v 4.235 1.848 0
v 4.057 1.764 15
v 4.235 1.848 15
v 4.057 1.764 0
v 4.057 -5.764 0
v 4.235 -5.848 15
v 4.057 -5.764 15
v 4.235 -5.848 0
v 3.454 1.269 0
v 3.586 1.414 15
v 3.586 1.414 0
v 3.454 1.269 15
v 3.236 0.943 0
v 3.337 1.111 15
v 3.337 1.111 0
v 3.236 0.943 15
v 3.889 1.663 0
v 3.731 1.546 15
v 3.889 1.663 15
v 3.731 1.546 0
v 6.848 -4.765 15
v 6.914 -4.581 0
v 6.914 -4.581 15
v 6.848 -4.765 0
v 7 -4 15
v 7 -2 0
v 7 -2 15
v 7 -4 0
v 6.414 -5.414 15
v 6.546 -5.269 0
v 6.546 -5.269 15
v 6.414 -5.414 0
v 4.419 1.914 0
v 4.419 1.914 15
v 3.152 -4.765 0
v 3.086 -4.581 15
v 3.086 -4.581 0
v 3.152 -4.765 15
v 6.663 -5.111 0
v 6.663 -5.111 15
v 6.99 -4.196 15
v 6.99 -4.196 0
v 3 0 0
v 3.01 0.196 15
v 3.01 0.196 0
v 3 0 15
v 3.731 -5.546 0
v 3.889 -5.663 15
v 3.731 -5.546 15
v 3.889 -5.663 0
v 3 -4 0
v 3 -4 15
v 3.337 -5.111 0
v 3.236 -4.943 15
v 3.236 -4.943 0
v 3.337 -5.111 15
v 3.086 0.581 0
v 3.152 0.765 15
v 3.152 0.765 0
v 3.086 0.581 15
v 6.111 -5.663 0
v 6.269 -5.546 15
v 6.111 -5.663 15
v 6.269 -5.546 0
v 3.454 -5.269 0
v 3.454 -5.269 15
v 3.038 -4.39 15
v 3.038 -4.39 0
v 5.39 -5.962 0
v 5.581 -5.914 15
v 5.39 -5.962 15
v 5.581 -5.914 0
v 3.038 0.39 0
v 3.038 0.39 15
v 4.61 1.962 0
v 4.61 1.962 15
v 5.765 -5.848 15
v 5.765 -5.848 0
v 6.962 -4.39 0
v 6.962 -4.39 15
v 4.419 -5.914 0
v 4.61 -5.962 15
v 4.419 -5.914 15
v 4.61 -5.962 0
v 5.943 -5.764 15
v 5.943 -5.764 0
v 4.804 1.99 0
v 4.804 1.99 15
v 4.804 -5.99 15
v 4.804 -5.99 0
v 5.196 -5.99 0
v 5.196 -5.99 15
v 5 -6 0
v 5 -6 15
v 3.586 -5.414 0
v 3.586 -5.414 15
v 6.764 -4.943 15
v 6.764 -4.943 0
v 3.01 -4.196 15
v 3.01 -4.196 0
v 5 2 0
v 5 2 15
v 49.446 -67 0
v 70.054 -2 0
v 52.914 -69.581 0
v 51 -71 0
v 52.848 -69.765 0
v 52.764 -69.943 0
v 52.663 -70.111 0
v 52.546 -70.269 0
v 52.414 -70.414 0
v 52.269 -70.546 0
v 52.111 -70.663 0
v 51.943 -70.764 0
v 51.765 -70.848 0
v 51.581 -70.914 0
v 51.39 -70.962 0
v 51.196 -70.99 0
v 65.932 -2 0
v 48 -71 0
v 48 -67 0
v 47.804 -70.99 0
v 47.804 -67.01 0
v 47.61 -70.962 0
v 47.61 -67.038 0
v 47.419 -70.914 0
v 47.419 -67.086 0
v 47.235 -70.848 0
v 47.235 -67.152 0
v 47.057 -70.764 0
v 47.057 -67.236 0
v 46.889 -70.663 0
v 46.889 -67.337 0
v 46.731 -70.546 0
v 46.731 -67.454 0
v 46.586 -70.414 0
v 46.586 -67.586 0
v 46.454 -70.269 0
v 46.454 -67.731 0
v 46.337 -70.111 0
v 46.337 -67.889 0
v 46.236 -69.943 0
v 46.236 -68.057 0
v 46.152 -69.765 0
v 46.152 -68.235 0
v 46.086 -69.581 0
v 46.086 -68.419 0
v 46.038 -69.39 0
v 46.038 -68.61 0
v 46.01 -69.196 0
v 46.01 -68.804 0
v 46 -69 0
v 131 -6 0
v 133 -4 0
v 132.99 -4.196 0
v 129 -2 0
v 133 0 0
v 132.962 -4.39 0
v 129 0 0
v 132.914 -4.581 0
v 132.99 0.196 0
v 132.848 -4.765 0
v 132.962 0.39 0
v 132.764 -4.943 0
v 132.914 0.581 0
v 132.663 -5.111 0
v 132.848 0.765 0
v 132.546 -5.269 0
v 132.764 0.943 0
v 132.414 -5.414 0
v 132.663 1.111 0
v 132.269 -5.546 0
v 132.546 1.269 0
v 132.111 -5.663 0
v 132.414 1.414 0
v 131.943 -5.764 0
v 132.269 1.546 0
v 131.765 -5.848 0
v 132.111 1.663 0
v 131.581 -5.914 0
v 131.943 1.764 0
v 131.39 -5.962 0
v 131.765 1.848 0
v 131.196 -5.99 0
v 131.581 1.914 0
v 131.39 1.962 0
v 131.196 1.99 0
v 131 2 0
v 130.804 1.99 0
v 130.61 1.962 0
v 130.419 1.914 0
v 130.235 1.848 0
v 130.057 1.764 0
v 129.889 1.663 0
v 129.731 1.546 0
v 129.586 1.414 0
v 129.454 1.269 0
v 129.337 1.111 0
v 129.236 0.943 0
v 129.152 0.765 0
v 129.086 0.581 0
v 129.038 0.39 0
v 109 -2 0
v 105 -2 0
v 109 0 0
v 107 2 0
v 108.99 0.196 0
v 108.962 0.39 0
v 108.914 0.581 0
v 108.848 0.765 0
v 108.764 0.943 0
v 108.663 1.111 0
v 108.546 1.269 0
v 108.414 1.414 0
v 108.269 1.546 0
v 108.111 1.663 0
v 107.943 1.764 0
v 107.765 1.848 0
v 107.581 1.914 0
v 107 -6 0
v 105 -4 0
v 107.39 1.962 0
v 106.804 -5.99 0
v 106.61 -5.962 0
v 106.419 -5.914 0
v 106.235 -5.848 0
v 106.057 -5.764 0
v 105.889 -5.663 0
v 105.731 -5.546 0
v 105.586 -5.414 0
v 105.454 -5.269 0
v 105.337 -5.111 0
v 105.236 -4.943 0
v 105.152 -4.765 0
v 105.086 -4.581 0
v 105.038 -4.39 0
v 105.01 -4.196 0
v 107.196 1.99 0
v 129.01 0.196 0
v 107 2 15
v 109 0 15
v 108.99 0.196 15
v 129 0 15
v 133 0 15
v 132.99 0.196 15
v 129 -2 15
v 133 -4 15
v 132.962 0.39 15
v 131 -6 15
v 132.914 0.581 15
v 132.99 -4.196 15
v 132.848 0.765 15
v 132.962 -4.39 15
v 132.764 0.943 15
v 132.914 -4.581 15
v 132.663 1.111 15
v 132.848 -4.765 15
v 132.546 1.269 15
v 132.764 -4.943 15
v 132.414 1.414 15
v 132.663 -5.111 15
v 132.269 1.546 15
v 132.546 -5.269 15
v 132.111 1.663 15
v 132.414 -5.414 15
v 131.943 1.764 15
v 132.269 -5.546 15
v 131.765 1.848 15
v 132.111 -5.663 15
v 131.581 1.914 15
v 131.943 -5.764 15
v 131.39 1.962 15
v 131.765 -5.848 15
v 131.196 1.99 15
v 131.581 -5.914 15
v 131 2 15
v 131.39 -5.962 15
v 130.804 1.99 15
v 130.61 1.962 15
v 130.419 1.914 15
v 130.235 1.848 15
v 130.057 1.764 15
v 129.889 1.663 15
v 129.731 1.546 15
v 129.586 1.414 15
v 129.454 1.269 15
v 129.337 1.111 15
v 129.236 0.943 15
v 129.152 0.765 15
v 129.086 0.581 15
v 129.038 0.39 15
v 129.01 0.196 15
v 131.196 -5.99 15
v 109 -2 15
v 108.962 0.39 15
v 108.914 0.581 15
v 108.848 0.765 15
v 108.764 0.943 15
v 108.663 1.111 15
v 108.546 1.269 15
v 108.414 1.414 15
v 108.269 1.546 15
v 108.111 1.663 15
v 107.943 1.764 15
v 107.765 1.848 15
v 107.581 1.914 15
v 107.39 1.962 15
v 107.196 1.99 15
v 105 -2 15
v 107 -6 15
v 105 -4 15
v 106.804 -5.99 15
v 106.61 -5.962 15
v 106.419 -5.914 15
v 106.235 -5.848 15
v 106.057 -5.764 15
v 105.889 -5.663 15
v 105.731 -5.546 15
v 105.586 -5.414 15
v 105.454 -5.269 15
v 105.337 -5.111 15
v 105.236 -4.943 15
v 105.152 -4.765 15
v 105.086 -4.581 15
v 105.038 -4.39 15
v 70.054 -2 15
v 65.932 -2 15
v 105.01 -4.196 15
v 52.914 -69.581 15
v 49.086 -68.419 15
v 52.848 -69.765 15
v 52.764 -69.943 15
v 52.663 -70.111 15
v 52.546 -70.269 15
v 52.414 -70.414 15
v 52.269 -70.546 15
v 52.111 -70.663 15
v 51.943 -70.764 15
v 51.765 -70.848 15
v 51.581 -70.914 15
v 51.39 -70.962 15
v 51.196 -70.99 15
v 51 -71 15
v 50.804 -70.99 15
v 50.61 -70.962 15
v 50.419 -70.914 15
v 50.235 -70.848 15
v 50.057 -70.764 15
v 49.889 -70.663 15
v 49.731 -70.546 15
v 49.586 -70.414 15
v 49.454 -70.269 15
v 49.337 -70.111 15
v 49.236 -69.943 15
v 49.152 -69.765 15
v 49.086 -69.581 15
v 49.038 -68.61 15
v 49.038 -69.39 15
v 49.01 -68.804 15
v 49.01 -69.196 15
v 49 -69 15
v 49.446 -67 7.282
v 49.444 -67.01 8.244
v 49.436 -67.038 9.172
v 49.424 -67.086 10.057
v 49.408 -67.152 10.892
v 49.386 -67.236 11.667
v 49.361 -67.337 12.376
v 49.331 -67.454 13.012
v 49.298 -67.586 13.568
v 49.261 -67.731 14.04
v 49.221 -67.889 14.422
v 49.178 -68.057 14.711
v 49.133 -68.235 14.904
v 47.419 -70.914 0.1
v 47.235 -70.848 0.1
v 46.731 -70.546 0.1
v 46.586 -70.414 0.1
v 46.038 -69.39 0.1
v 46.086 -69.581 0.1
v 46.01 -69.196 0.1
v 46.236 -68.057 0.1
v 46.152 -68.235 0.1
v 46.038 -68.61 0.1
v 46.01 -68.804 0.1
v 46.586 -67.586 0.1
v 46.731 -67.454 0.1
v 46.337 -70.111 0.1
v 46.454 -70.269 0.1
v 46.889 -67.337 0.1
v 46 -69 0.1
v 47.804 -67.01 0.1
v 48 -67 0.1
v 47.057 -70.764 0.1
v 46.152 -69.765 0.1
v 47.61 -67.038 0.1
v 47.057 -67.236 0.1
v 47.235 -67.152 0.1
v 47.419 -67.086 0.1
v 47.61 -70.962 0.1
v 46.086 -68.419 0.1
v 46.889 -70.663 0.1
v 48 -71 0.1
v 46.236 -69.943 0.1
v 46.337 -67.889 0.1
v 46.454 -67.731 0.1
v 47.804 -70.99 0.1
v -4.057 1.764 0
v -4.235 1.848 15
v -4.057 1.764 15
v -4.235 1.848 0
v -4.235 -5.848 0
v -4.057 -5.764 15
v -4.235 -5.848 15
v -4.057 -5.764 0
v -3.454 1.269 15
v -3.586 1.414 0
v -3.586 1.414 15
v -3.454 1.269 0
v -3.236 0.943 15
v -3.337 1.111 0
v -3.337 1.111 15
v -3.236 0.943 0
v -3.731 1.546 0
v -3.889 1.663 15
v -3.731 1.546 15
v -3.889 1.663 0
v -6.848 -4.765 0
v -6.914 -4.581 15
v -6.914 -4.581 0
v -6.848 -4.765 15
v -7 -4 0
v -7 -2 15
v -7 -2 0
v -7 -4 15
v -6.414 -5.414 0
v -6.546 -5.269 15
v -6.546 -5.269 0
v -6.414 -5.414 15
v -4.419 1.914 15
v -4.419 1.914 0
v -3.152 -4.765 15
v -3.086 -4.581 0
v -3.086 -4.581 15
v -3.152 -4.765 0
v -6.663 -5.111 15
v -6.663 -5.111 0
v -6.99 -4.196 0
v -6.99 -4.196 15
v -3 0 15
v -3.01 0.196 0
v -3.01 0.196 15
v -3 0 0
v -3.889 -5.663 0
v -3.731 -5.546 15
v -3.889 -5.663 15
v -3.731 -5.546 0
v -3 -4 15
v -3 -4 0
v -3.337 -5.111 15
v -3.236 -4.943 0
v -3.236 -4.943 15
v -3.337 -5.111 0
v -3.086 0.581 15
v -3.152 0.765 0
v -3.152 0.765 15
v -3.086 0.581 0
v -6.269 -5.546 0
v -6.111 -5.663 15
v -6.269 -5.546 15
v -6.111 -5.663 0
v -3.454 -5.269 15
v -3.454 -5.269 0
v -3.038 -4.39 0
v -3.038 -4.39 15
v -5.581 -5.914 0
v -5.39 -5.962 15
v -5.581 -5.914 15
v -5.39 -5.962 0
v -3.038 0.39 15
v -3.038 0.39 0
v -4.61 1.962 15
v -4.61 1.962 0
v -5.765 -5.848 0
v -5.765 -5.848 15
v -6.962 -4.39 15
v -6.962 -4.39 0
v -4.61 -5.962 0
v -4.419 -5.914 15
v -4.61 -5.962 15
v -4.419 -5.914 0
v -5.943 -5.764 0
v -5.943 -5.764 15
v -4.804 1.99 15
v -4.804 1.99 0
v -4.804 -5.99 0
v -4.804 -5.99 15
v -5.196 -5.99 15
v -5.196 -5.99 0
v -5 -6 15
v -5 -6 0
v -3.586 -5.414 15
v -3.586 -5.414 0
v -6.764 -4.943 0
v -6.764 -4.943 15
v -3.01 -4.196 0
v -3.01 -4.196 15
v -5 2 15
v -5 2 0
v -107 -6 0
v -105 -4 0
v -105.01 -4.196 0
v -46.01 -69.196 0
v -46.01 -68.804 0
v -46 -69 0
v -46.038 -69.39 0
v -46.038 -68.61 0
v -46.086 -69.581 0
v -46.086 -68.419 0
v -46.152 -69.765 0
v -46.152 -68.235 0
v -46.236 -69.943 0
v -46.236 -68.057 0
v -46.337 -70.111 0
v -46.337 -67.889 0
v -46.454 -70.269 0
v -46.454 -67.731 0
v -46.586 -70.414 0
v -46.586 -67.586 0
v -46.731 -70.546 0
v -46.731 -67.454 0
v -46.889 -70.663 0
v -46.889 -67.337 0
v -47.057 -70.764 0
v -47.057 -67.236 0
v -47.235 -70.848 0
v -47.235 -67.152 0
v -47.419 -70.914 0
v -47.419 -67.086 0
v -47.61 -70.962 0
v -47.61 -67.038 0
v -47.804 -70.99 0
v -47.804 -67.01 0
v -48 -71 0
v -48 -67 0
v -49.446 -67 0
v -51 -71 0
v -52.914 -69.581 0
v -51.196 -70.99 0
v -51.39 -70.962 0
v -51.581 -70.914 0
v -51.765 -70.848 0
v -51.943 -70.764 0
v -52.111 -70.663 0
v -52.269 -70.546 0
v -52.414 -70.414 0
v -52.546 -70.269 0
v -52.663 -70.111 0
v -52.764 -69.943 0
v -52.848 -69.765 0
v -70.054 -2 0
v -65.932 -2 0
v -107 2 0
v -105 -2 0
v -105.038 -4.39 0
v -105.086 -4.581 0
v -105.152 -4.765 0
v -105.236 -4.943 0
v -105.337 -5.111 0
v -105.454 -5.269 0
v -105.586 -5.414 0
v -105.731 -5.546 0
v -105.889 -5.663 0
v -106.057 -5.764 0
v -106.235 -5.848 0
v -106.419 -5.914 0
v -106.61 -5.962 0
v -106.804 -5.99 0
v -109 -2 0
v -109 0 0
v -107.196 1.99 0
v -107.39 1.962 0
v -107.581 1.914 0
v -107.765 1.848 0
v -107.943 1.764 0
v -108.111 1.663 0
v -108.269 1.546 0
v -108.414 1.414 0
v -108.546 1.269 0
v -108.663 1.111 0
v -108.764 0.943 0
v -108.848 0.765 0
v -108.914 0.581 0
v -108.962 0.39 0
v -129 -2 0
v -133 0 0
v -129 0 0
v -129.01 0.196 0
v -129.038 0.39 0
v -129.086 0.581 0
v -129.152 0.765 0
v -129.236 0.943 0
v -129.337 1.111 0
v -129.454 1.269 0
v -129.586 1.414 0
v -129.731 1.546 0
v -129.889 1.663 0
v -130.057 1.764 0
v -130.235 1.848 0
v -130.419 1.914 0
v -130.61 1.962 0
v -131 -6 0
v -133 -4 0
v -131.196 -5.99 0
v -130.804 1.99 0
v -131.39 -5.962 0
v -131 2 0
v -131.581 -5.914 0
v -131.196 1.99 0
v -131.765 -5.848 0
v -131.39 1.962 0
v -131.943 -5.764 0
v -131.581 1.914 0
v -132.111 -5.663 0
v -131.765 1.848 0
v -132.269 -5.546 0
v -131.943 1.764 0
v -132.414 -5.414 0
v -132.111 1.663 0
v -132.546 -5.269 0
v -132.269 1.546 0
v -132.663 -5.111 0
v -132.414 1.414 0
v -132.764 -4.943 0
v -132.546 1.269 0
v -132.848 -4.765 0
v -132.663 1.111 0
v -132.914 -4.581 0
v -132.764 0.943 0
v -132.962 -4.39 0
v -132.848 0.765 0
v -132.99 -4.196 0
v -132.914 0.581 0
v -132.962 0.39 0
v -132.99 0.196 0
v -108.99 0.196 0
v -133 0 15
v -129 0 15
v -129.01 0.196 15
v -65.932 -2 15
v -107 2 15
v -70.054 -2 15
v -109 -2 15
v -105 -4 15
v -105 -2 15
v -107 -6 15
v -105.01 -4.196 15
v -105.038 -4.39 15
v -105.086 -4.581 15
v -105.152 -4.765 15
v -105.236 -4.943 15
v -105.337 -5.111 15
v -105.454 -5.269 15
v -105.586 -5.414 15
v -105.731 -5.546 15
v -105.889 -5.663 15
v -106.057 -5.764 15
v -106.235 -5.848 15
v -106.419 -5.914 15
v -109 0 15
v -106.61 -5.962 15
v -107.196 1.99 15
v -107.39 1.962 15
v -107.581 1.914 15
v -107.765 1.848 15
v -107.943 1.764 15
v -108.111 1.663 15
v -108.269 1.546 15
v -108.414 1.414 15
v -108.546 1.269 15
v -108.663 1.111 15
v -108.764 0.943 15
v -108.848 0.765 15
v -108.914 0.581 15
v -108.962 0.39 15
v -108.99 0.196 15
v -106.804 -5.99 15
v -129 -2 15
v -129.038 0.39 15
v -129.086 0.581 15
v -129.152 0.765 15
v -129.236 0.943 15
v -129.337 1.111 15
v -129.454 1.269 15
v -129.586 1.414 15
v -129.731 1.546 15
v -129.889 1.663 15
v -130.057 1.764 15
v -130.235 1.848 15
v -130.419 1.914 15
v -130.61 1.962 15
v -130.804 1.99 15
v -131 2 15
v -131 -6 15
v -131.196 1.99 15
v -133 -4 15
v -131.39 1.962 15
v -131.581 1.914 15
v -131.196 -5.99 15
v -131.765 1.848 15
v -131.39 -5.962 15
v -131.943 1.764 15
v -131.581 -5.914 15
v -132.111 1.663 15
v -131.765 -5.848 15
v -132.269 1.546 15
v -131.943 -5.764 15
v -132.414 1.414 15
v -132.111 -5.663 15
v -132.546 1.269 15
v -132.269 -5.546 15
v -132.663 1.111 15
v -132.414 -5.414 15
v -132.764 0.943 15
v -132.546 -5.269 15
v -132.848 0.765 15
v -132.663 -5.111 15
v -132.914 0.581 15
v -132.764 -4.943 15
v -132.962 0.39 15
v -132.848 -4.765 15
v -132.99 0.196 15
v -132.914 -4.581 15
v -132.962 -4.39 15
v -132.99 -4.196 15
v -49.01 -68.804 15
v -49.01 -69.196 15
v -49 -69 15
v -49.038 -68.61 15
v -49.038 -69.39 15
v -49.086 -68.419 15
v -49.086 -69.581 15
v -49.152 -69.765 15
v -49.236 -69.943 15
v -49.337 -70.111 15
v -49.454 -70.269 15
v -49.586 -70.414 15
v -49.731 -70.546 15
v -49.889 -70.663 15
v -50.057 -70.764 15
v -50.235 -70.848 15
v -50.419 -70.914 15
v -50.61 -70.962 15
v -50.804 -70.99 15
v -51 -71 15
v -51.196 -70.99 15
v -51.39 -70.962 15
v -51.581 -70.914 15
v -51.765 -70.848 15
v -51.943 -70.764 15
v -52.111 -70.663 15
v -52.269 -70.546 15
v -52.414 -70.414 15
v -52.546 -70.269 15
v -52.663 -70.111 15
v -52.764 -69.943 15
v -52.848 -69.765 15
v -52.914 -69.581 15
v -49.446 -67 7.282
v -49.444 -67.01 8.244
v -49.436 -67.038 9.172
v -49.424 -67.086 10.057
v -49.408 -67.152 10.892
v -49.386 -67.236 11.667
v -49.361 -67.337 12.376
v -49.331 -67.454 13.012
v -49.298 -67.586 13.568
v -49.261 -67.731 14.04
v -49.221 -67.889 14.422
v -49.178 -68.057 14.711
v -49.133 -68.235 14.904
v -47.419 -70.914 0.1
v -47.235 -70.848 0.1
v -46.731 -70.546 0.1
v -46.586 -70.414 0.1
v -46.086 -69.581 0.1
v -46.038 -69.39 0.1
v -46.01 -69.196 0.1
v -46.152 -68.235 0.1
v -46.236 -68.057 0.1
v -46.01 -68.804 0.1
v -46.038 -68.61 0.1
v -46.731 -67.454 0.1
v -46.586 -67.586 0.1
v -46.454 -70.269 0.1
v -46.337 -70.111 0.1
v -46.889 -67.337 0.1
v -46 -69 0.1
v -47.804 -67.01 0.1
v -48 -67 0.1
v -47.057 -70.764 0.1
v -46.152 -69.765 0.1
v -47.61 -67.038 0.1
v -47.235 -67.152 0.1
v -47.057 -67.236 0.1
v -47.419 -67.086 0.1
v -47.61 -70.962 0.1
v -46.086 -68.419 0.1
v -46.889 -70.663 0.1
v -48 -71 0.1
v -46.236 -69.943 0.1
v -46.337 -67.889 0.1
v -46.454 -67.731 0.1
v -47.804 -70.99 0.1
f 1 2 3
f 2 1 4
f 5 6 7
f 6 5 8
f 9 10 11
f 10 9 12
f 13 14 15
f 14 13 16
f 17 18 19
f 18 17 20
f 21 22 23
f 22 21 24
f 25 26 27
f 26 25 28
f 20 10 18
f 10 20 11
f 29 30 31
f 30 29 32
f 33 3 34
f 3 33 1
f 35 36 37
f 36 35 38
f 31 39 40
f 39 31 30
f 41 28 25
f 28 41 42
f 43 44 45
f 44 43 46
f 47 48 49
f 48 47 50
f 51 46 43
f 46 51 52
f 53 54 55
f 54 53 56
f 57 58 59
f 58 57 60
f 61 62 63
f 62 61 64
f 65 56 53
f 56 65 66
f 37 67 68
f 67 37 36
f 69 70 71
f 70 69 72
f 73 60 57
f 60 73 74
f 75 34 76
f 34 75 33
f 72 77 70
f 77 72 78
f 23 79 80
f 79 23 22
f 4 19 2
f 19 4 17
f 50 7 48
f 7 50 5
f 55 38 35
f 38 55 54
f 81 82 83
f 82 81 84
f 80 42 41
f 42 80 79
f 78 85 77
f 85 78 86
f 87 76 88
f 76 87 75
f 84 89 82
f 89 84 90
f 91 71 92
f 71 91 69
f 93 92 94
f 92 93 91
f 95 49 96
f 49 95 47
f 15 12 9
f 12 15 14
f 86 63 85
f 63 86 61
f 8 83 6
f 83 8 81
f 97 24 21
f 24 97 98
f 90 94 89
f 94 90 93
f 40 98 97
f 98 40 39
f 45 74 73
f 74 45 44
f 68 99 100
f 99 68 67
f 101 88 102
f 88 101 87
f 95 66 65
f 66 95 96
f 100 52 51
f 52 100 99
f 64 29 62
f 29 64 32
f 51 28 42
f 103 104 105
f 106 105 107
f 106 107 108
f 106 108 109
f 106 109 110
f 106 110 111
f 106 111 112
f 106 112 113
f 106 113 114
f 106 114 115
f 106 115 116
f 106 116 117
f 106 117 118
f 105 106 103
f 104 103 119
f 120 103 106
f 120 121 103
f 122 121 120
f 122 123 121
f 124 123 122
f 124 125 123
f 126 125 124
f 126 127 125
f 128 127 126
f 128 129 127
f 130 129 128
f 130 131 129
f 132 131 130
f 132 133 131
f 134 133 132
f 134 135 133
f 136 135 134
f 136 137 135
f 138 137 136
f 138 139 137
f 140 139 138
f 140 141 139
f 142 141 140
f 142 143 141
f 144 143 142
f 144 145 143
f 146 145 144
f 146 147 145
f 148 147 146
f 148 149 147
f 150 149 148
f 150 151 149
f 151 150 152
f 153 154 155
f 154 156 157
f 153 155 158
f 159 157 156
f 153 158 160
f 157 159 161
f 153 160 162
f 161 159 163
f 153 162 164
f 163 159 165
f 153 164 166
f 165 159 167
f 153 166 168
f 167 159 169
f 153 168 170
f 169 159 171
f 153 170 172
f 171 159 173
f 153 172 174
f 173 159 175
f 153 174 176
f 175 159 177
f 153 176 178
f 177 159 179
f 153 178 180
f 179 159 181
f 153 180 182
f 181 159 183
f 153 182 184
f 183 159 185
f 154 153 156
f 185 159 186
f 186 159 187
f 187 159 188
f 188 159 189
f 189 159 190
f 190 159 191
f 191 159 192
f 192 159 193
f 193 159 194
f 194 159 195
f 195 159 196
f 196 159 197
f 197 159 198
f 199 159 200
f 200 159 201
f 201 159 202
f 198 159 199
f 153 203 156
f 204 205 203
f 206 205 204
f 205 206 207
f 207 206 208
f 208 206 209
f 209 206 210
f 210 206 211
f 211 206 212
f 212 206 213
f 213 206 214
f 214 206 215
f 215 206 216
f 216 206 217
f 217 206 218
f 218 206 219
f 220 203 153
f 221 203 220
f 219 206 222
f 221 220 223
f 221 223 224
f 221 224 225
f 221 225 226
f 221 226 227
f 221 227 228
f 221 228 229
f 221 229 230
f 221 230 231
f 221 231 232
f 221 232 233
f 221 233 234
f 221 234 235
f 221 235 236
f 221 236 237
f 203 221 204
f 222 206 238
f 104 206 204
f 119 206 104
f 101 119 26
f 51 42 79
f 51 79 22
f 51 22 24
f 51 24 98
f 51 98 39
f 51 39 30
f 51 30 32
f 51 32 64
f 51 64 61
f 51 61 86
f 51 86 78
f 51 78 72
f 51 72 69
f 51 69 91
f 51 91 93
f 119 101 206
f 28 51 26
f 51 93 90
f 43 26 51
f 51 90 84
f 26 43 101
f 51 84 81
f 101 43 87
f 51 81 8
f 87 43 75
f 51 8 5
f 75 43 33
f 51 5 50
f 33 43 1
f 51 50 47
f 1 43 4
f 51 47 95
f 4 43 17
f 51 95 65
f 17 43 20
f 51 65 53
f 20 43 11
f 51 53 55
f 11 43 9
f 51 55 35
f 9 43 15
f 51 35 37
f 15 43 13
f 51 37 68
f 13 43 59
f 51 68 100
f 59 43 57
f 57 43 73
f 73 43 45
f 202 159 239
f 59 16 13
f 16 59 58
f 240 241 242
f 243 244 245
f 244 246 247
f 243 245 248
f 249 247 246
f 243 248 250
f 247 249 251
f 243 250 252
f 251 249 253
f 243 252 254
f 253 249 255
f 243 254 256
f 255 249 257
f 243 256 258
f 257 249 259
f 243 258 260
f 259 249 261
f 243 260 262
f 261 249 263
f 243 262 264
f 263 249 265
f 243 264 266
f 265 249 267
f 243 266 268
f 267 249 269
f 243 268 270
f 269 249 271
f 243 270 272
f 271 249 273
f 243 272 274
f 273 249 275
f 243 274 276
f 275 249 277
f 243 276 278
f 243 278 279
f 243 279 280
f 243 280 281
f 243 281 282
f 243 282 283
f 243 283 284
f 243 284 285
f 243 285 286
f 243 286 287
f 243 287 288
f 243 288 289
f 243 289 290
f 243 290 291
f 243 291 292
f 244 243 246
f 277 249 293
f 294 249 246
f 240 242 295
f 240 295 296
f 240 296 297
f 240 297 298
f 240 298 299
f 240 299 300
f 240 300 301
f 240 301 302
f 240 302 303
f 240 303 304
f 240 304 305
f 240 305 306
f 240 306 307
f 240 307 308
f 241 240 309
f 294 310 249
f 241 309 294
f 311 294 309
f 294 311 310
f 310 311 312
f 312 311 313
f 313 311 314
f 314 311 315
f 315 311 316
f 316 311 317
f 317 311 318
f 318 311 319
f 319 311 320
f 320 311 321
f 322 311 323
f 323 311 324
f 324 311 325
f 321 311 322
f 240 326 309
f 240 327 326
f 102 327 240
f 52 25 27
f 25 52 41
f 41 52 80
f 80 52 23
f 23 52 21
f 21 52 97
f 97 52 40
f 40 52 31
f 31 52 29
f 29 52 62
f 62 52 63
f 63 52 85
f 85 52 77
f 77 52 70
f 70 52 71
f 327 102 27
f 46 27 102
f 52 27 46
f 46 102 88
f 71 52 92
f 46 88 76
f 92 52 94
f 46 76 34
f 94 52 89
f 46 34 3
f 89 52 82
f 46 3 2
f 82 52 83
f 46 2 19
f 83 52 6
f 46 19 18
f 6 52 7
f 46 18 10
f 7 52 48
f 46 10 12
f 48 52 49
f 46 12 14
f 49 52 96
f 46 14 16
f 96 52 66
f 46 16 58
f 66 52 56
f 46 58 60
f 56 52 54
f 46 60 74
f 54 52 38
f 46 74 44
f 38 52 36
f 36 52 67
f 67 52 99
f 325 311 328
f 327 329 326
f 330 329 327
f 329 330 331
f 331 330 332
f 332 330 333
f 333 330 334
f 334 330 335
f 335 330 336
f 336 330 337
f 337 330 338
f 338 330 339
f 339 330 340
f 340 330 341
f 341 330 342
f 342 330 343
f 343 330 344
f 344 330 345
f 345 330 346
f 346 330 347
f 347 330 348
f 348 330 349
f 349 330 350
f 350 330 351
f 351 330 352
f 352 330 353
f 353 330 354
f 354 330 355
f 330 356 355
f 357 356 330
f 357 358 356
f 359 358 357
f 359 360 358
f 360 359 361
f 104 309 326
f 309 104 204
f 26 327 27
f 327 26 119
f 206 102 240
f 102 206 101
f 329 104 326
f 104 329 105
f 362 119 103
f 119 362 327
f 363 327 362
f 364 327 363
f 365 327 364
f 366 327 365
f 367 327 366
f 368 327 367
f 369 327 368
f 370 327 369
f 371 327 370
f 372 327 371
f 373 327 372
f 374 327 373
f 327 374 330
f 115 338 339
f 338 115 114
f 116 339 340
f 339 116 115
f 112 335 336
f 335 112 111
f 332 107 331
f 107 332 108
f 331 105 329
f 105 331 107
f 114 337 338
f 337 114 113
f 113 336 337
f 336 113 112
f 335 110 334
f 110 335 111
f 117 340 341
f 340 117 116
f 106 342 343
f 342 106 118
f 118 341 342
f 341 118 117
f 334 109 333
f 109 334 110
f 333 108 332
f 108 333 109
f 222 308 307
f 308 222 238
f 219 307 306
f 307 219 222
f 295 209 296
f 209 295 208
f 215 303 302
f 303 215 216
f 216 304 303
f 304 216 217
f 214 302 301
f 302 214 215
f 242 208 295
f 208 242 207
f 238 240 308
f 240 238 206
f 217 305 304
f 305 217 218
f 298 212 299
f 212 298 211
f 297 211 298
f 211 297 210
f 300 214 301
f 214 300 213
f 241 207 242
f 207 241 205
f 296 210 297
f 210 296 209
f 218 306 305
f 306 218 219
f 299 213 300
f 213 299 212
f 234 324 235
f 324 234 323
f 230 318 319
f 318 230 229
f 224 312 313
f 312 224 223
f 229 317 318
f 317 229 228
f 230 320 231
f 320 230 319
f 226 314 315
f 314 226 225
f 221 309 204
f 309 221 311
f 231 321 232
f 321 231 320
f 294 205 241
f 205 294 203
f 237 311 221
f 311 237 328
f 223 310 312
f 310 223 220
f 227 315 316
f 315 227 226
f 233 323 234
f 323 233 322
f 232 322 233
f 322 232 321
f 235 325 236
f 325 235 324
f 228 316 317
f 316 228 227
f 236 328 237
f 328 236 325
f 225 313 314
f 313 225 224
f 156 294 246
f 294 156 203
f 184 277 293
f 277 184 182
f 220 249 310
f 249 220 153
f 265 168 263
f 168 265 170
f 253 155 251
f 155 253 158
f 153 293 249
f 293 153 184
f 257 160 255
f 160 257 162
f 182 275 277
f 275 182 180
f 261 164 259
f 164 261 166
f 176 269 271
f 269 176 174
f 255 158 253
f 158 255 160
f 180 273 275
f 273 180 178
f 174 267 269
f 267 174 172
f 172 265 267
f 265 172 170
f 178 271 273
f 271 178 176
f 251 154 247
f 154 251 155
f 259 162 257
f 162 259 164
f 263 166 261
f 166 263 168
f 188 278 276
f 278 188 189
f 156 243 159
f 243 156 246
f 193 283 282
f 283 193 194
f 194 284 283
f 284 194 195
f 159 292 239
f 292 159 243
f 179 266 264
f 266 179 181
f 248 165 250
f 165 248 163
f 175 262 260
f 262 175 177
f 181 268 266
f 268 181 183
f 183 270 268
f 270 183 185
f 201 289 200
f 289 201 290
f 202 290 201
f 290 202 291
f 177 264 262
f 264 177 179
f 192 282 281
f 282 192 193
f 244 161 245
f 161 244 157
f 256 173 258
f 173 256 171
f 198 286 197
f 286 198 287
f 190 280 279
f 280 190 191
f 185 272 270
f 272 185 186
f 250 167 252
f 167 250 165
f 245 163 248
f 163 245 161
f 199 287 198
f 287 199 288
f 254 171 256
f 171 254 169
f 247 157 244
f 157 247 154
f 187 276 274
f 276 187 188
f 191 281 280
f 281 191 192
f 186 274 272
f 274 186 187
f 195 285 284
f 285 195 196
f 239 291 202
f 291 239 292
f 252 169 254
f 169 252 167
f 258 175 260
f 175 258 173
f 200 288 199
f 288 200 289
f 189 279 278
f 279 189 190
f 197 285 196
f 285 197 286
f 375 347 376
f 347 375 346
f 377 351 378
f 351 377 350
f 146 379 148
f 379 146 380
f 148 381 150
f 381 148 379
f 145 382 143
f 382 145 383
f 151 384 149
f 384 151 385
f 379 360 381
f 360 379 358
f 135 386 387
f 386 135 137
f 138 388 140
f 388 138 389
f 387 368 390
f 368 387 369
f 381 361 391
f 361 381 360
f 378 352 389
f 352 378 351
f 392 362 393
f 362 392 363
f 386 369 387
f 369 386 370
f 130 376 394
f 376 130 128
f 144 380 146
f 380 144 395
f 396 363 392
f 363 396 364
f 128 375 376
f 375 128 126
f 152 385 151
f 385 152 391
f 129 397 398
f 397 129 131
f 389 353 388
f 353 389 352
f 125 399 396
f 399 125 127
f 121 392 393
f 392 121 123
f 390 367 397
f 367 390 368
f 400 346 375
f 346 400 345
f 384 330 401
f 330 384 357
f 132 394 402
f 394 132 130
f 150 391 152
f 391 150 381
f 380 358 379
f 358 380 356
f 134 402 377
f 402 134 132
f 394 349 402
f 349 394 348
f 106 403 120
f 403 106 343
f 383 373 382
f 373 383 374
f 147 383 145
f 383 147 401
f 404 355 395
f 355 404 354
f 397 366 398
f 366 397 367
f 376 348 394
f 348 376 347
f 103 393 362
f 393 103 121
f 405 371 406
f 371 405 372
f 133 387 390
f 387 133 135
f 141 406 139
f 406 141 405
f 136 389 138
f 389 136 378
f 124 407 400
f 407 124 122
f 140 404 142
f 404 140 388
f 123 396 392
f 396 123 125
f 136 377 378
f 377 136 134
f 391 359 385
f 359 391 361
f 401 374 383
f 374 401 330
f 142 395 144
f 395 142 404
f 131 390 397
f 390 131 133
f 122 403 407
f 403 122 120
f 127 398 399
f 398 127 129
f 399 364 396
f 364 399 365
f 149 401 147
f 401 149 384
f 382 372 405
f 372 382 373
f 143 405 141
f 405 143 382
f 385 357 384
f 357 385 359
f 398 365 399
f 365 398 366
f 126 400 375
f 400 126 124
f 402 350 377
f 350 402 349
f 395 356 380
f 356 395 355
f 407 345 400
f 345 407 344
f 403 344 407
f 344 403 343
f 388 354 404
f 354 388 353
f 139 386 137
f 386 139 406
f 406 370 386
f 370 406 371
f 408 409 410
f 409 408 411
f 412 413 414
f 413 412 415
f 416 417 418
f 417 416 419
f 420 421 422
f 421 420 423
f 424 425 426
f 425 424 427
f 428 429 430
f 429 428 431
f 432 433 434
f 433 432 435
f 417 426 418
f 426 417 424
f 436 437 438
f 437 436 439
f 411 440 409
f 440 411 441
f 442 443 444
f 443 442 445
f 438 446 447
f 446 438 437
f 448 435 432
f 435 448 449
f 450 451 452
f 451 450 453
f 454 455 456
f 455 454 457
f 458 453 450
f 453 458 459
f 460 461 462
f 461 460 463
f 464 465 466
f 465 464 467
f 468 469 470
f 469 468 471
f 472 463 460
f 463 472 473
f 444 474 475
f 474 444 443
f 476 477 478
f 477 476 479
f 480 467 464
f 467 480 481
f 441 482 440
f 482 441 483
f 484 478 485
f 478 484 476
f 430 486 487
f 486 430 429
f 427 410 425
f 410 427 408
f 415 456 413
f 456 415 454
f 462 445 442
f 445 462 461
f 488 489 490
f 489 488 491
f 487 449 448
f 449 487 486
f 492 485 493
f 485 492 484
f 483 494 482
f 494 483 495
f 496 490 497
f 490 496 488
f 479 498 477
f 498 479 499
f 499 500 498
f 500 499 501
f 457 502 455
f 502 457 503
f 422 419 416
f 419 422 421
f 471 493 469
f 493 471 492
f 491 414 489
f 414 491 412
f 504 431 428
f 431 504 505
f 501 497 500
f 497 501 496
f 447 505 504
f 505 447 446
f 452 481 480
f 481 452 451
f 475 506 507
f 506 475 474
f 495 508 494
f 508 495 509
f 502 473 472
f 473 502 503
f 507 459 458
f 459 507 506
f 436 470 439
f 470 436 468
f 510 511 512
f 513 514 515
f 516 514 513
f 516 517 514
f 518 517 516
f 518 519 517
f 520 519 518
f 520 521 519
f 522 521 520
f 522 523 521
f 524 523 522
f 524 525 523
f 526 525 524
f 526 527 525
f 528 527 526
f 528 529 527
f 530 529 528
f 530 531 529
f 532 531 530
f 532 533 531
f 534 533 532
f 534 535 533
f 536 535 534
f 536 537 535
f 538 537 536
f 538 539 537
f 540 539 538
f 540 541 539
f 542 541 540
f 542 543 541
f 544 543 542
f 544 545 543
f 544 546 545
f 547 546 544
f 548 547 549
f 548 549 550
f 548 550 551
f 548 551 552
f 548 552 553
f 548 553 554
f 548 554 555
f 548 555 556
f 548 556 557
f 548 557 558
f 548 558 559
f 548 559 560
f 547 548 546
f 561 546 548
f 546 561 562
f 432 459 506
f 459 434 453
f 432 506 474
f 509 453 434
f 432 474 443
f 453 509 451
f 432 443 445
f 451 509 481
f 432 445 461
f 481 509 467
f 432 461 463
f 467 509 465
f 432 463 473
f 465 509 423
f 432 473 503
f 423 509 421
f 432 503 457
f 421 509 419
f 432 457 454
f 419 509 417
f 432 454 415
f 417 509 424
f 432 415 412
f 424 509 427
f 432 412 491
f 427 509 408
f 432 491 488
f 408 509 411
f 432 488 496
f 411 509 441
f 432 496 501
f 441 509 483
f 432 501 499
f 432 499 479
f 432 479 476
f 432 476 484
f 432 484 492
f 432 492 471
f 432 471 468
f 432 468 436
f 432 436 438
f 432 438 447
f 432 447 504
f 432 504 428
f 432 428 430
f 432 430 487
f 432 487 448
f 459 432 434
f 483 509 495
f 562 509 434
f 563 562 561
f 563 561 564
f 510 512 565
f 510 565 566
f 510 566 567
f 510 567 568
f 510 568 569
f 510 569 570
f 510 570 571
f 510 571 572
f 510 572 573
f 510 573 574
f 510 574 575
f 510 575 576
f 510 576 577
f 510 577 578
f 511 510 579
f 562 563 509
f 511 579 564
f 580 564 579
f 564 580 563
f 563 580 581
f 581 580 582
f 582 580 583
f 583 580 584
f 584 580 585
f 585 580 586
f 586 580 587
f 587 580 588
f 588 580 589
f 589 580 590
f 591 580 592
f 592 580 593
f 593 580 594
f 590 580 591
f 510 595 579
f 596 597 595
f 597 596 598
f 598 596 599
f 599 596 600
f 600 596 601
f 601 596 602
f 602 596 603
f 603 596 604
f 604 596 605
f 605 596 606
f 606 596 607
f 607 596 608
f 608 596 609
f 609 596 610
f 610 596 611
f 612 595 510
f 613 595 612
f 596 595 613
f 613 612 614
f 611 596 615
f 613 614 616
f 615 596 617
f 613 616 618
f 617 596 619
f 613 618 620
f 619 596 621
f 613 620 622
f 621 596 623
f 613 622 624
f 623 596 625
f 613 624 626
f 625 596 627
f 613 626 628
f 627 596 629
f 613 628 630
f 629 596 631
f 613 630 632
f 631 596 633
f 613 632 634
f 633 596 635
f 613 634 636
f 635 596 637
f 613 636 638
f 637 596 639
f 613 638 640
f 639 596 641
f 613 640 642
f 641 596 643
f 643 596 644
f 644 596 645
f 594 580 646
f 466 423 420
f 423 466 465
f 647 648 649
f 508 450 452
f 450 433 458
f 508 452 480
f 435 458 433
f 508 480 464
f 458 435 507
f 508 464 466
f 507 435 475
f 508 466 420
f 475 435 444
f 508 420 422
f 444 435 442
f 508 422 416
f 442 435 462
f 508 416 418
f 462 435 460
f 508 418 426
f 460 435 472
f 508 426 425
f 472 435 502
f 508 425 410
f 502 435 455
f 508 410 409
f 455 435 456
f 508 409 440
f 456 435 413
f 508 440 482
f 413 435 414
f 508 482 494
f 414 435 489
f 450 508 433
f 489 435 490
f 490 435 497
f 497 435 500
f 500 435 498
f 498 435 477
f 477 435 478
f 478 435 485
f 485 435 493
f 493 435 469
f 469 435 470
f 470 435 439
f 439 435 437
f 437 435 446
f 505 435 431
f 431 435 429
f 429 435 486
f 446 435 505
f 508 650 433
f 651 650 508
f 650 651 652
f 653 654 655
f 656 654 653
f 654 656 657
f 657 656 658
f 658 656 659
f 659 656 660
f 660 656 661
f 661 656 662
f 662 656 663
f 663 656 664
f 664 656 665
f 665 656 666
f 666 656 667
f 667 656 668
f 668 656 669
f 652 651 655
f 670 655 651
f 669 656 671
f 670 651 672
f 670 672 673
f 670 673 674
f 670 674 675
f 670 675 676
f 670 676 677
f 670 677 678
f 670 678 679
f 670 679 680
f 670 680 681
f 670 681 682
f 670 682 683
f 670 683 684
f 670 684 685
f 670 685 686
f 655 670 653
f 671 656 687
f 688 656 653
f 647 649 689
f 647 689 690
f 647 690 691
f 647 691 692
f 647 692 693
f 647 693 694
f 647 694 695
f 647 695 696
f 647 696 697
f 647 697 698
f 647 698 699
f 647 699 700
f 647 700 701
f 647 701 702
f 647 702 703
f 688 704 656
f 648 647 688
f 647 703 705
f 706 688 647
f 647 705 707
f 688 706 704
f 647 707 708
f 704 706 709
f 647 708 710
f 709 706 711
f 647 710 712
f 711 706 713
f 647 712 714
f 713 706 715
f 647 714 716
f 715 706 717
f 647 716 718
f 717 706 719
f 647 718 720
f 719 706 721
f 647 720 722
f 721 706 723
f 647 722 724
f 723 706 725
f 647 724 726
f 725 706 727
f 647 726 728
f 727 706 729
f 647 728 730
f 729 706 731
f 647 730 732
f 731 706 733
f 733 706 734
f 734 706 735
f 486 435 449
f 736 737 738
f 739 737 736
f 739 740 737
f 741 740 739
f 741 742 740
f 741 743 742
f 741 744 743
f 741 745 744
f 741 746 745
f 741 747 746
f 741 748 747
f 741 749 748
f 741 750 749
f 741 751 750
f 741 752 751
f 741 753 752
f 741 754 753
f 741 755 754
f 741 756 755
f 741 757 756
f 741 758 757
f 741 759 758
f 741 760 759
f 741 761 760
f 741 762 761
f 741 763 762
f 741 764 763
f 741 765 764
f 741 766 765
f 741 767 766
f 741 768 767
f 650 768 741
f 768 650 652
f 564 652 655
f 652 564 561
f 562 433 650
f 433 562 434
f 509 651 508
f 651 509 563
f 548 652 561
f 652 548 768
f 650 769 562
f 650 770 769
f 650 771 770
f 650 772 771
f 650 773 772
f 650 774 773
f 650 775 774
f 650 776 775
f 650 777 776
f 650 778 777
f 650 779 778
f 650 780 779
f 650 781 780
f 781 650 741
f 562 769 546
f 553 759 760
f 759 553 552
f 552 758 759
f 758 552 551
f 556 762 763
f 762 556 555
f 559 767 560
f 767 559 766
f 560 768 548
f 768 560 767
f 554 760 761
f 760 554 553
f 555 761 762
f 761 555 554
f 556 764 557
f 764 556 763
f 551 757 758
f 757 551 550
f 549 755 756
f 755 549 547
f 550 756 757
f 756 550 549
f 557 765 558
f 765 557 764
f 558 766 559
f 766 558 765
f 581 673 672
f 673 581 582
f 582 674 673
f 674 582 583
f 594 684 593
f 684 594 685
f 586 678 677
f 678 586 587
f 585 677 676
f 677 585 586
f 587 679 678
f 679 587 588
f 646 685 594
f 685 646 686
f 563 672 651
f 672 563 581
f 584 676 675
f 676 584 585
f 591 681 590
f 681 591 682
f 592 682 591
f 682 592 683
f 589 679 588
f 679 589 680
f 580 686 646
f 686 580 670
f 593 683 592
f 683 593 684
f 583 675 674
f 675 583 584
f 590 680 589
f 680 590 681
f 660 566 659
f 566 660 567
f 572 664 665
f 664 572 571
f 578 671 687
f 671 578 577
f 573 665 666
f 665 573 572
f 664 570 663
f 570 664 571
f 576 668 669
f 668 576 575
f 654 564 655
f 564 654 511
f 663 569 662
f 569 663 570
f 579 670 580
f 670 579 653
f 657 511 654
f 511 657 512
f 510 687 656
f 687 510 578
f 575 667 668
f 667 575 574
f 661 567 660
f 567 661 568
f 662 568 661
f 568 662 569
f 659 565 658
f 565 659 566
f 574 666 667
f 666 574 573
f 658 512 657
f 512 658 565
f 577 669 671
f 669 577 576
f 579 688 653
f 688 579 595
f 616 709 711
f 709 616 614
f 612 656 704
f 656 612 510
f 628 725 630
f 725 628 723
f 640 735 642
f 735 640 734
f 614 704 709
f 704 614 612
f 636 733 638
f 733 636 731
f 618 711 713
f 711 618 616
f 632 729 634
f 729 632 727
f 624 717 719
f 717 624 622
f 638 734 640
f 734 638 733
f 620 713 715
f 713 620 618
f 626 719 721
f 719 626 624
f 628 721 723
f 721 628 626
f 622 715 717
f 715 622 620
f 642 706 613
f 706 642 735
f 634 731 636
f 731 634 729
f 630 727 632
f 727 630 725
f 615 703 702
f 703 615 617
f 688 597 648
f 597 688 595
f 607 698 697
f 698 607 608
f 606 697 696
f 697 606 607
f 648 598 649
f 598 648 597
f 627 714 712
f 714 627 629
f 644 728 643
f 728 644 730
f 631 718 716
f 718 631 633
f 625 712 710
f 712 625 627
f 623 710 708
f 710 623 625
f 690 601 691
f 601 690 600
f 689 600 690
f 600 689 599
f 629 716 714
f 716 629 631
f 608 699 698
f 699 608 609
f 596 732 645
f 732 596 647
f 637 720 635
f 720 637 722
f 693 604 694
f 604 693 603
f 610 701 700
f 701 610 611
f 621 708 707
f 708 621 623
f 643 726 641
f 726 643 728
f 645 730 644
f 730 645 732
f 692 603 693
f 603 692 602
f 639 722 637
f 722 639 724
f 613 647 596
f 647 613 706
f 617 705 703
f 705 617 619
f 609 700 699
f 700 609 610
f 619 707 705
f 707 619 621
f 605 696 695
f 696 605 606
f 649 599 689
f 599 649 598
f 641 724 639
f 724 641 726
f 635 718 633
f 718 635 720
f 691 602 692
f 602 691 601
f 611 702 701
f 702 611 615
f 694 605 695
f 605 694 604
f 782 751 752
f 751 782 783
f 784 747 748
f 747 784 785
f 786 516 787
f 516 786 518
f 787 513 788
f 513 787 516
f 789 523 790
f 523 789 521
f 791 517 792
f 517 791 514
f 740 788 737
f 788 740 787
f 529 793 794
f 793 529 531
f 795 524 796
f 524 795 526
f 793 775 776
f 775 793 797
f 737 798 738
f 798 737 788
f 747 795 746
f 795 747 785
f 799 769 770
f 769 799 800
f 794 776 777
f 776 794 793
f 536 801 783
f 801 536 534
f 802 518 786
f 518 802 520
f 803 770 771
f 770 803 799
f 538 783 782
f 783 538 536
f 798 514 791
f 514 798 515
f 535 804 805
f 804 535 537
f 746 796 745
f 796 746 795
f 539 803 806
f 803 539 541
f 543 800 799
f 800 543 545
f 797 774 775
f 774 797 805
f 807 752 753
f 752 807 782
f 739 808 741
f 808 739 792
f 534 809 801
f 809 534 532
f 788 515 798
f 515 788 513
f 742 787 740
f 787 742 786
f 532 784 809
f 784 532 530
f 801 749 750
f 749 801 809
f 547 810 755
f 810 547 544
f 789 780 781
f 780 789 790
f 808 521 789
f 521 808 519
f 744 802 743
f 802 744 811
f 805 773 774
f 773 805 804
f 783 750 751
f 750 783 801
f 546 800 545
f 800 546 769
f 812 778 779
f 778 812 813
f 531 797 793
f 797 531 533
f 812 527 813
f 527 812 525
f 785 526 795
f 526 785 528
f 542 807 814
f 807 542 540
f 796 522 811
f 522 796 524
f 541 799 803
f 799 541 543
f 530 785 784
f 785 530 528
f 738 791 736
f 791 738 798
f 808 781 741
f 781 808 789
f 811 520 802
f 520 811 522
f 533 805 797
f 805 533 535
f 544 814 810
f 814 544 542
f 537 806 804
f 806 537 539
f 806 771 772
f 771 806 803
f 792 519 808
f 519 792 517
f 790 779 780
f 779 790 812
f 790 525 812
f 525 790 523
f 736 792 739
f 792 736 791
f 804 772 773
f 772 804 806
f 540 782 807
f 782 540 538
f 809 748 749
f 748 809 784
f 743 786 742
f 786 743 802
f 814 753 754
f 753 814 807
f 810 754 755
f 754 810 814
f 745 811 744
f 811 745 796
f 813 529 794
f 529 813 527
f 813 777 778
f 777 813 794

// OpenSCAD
// Details of cylinders
$fn = $preview ? 16 : 64;

// Create the left side version
module left_side_holder() {
  // Thickness of materials and front hook
  thickness = 4;

  // Holder width
  holder_width = 15;

  // Points
  point_front_hook = [0, -thickness, 0];
  point_front_top = [0, 0, 0];
  point_arm_mount = [63.5, 0, 0];
  point_arm_tip = [46, -69, 0];
  point_arm_hook_start_top = [102, 0, 0];
  point_arm_hook_start_bottom = [102, -thickness, 0];
  point_arm_hook_end_bottom = [126, -thickness, 0];
  point_arm_hook_end_top = [126, 0, 0];

  // Union all objects and move them a little bit to not cover 0,0,0
  translate([5, 0, 0]) union() {
    // Render objects
    for (i = [[point_front_hook, point_front_top],
              [point_front_top, point_arm_mount],
              [point_arm_mount, point_arm_tip],
              [point_arm_mount, point_arm_hook_start_top],
              [point_arm_hook_start_top,point_arm_hook_start_bottom],
              [point_arm_hook_start_bottom,point_arm_hook_end_bottom],
              [point_arm_hook_end_bottom,point_arm_hook_end_top]]) {
      hull() {
        translate(i[0]) cylinder(d=thickness, h=holder_width);
        translate(i[1]) cylinder(d=thickness, h=holder_width);
      }
    }

    // Separate support object to get the angle right on the arm tip.
    hull() {
      translate([43, -69, 0]) cylinder(d=thickness, h=0.1);
      translate([46, -69, 0]) cylinder(d=thickness, h=holder_width);
    }
  }
}

// Make a mirror for the right side object.
module right_side_holder() {
  mirror([1, 0, 0]) left_side_holder();
}

left_side_holder();
right_side_holder();
